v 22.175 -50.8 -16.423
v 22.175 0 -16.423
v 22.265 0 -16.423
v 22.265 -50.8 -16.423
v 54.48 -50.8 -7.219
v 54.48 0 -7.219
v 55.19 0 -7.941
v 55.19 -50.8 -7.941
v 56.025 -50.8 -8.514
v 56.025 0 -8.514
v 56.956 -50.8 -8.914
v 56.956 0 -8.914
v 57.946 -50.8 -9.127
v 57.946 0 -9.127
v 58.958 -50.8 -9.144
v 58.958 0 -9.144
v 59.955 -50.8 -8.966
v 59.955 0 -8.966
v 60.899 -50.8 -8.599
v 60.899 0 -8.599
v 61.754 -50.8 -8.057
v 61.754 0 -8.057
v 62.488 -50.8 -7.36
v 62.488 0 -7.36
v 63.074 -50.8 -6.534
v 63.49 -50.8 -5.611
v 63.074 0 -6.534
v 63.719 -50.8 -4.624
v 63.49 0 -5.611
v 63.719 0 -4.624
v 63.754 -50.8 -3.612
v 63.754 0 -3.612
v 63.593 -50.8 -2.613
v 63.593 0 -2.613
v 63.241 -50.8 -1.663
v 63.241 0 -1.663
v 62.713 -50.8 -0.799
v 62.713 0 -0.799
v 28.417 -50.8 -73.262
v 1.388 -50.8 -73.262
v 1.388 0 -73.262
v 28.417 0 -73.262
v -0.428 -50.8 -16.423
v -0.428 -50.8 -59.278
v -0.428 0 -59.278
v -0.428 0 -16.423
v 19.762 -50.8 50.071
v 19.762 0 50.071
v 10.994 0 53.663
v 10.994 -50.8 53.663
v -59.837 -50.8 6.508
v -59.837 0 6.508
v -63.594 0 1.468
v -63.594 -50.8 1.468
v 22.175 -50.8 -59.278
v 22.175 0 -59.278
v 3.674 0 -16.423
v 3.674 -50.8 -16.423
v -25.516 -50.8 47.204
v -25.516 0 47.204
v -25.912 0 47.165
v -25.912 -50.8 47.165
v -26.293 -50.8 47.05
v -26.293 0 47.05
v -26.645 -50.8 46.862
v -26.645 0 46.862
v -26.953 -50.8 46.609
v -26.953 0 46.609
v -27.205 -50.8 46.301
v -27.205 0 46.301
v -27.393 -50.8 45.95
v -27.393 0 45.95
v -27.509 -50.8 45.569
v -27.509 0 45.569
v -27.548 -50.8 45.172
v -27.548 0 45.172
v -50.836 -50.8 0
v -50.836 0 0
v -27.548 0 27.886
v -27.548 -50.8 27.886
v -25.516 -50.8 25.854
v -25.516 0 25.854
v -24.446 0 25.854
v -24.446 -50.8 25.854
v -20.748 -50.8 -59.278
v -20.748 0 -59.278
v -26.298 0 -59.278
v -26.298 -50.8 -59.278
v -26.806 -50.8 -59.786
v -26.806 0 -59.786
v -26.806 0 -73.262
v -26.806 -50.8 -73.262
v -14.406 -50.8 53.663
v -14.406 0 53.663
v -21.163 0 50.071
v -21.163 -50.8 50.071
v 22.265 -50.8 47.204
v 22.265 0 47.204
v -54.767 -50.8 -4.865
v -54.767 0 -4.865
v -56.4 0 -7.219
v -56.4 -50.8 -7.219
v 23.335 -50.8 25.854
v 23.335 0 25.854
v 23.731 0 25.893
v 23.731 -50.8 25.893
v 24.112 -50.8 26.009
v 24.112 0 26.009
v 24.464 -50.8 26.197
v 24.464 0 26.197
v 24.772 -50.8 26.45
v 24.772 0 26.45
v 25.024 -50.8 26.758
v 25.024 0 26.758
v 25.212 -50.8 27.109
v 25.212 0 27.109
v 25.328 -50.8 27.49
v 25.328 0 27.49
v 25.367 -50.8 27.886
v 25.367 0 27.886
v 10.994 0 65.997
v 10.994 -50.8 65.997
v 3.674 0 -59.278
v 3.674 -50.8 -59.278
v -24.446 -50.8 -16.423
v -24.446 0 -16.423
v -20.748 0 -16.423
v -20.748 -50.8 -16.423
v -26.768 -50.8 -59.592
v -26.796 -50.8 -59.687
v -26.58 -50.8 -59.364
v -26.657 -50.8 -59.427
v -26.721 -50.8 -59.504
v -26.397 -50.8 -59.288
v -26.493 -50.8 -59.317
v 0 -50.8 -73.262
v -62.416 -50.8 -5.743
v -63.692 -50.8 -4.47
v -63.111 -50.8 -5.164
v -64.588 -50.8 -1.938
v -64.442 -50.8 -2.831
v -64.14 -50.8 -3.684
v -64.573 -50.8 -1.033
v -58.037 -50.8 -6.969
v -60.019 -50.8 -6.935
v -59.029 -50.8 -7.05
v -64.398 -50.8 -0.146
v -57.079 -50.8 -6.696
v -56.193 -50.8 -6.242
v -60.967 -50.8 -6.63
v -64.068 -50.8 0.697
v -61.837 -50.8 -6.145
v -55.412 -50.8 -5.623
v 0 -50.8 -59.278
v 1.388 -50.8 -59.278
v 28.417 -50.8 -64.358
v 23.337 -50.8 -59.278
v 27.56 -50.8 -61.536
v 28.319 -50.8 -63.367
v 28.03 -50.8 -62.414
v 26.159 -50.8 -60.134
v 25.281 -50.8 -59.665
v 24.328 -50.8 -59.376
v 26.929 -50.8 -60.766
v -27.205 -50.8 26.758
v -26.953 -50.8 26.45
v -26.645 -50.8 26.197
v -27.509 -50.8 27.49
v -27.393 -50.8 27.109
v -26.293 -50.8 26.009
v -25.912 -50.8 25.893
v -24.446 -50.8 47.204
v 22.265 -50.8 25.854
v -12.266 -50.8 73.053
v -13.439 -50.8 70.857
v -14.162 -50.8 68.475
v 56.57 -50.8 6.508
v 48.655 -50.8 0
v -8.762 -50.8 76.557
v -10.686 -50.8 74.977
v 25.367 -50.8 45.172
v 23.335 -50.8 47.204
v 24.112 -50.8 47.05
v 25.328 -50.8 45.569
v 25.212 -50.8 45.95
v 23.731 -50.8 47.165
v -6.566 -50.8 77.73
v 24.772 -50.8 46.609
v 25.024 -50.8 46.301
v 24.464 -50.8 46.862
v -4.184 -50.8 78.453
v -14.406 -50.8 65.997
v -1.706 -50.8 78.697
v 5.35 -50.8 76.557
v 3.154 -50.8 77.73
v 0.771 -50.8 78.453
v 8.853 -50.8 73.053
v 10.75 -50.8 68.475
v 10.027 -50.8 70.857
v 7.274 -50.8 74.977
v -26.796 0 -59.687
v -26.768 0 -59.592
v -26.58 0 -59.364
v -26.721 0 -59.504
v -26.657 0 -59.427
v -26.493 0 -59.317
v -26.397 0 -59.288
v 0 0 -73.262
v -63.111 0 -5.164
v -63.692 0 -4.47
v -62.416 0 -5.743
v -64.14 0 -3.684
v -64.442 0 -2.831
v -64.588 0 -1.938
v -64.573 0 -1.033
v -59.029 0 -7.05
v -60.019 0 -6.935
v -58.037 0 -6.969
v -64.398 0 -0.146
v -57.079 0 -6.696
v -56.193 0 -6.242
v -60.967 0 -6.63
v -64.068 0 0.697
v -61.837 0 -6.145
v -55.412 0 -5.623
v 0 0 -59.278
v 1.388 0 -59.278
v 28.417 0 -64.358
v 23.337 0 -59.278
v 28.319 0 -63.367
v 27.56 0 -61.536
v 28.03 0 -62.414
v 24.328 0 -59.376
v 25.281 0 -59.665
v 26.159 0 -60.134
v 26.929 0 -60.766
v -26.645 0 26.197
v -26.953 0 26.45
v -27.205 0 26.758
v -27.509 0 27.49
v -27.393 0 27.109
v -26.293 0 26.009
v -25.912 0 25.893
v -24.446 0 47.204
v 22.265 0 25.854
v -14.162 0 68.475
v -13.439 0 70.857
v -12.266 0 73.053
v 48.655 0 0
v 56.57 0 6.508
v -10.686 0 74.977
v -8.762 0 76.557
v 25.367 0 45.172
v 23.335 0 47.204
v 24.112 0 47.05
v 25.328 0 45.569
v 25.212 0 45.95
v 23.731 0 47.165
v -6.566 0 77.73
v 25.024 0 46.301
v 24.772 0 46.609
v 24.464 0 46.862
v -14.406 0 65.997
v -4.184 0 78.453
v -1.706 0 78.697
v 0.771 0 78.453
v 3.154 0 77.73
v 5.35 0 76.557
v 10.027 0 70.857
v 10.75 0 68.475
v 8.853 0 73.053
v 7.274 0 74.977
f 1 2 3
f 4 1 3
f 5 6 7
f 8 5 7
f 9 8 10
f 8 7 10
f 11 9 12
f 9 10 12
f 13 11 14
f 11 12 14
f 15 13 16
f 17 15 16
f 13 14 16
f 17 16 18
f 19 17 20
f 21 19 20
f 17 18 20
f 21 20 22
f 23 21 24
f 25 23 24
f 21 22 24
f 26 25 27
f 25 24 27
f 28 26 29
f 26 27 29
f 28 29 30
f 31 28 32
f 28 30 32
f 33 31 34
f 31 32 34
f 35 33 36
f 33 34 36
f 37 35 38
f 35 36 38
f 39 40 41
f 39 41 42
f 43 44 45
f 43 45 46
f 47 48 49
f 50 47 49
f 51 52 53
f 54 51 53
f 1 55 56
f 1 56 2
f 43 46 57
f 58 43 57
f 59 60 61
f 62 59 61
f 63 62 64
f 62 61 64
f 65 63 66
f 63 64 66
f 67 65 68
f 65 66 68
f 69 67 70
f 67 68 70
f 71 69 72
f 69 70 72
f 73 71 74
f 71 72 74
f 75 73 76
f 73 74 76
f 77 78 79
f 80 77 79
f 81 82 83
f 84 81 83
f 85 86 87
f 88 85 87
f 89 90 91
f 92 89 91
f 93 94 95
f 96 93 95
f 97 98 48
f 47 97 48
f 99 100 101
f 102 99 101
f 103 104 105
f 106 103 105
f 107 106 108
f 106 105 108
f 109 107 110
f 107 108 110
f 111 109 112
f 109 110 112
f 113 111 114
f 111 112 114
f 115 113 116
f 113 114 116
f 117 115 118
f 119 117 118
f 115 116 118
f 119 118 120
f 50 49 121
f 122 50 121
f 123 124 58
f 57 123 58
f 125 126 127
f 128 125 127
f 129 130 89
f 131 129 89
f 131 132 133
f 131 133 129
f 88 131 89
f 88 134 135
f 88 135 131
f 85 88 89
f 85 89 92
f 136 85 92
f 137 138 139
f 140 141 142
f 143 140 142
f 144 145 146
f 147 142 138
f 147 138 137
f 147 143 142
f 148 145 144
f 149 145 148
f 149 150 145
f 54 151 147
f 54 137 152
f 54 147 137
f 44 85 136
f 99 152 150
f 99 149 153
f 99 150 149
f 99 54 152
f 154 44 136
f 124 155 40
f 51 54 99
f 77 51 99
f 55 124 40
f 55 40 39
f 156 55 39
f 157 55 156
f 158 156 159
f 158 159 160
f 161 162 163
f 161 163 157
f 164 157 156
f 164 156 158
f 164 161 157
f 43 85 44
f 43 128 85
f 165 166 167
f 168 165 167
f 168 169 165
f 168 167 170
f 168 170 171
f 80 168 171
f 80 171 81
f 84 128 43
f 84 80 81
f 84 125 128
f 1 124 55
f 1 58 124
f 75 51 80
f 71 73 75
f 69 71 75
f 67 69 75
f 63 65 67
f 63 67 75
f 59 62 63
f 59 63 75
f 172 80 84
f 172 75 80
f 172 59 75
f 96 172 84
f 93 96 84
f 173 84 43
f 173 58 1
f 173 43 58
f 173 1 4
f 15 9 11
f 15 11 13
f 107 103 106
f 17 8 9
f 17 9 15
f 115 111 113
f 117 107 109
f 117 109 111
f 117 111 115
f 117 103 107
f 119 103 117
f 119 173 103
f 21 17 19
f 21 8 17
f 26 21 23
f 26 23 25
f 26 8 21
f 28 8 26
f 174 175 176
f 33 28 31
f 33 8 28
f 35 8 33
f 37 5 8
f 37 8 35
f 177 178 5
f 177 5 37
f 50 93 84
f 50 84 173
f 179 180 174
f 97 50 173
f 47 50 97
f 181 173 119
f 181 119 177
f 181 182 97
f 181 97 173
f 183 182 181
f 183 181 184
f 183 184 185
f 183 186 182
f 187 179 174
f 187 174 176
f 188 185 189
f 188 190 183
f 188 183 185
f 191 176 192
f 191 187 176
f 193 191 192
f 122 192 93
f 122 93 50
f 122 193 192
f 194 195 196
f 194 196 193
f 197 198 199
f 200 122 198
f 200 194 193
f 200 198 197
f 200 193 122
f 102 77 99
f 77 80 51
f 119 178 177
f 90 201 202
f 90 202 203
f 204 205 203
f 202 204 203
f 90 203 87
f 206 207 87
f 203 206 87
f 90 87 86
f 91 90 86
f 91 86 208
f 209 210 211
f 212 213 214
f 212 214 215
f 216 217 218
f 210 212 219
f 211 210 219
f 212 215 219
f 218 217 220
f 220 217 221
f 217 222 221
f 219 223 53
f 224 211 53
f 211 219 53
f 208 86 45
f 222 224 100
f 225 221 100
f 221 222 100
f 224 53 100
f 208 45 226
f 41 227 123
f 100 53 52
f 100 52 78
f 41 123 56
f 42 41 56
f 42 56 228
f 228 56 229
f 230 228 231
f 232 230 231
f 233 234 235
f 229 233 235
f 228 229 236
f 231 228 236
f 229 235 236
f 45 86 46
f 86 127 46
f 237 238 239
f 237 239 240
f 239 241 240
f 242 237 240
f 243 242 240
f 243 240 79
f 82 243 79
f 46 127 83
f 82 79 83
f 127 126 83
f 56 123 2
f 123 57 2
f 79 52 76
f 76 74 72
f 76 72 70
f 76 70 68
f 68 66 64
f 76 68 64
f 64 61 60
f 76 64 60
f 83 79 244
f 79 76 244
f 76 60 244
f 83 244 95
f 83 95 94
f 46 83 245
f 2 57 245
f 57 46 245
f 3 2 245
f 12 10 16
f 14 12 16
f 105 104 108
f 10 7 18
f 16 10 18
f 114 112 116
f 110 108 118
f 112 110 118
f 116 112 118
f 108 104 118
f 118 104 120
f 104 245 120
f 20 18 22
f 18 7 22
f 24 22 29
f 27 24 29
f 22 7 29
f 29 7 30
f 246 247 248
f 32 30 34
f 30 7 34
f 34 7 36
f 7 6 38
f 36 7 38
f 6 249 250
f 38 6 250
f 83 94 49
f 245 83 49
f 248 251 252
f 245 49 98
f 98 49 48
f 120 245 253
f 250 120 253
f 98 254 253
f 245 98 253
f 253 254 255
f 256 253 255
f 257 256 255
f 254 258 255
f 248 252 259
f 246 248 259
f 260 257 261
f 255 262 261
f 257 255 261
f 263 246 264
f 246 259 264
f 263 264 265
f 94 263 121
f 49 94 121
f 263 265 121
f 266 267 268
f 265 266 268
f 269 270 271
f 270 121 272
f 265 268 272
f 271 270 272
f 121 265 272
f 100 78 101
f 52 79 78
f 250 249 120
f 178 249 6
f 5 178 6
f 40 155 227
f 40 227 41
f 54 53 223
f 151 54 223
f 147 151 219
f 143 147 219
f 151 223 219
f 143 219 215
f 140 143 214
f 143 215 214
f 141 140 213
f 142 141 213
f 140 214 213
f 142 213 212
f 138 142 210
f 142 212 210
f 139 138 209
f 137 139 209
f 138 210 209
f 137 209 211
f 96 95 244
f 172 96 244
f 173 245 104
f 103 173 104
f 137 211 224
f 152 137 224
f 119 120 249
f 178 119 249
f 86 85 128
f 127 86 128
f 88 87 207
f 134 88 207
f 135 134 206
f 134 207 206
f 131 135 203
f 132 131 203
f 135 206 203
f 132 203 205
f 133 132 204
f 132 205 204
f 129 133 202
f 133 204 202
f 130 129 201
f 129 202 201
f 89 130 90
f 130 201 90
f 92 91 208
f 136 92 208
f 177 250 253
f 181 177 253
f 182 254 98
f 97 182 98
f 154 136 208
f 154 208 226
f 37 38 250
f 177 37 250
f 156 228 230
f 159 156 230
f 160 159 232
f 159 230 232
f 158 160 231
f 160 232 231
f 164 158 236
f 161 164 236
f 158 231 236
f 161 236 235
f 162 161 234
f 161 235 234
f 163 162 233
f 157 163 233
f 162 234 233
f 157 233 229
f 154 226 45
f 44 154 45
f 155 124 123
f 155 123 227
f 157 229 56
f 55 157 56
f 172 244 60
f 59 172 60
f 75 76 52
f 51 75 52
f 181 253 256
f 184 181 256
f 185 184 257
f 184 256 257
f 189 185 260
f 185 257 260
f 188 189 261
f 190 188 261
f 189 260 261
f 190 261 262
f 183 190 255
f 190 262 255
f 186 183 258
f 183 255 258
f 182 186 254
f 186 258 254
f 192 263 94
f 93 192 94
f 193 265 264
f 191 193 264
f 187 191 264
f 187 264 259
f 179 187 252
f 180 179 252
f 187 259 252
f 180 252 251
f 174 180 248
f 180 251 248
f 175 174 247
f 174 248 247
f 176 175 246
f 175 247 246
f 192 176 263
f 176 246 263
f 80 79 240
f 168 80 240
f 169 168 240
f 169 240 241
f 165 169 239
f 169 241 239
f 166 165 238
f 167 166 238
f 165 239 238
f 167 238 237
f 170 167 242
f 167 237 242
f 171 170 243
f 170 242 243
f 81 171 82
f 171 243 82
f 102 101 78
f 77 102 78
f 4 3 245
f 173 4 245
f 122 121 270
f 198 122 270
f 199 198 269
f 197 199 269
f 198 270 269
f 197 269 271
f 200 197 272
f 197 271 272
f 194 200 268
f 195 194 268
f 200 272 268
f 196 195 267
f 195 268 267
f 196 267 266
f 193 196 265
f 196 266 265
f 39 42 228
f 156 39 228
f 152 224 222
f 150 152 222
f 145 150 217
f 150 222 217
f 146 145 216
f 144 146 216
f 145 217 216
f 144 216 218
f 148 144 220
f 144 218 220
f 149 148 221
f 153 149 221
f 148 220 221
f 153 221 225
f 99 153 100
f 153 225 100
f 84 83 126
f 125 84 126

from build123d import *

# Parameters (mm, degrees)
F0_W     = 20.32
F0_H     = 42.8552175019
F0_W_2   = 18.5010901187
F1_DEPTH = 50.8


with BuildPart() as f1:
    # F0 (on Front) → F1 (new body)
    with BuildSketch(Plane.XZ):
        with BuildLine():
            Line((19.7615846992, 50.0709023562), (10.9937762186, 53.6630048046))
            ThreePointArc((10.9937762186, 53.6630048046), (9.505878667, 50.0709023562), (5.9137762186, 48.5830048046))
            Line((5.9137762186, 48.5830048046), (-1.7062237814, 48.5830048046))
            Line((-1.7062237814, 48.5830048046), (-9.3262237814, 48.5830048046))
            ThreePointArc((-9.3262237814, 48.5830048046), (-12.9183262298, 50.0709023562), (-14.4062237814, 53.6630048046))
            Line((-14.4062237814, 53.6630048046), (-21.1631003767, 50.0709023562))
            Line((-21.1631003767, 50.0709023562), (-24.4459839703, 47.2041854043))
            Line((-24.4459839703, 47.2041854043), (-24.4459839703, 25.8544358869))
            Line((-24.4459839703, 25.8544358869), (-24.4459839703, -16.4229627699))
            Line((-24.4459839703, -16.4229627699), (-20.7482980642, -16.4229627699))
            Line((-20.7482980642, -16.4229627699), (-0.4282980642, -16.4229627699))
            Line((-0.4282980642, -16.4229627699), (3.6740194462, -16.4229627699))
            Line((3.6740194462, -16.4229627699), (22.1751095649, -16.4229627699))
            Line((22.1751095649, -16.4229627699), (22.2648918826, -16.4229627699))
            Line((22.2648918826, -16.4229627699), (22.2648918826, 25.8544358869))
            Line((22.2648918826, 25.8544358869), (22.2648918826, 47.2041854043))
            Line((22.2648918826, 47.2041854043), (19.7615846992, 50.0709023562))
        make_face()
        with BuildLine():
            Line((23.3347140718, 47.2041854043), (22.2648918826, 47.2041854043))
            Line((22.2648918826, 47.2041854043), (22.2648918826, 25.8544358869))
            Line((22.2648918826, 25.8544358869), (23.3347140718, 25.8544358869))
            ThreePointArc((23.3347140718, 25.8544358869), (24.7715550512, 26.4495949076), (25.3667140718, 27.8864358869))
            Line((25.3667140718, 27.8864358869), (25.3667140718, 45.1721854043))
            ThreePointArc((25.3667140718, 45.1721854043), (24.7715550512, 46.6090263836), (23.3347140718, 47.2041854043))
        make_face()
        Polygon((56.5698947954, 6.5076726805), (25.3667140718, 45.1721854043), (25.3667140718, 27.8864358869), (48.6546903849, 0), (52.1676763892, 2.9549777973), align=None)
        with BuildLine():
            Line((62.7134148699, -0.7986944953), (56.5698947954, 6.5076726805))
            Line((56.5698947954, 6.5076726805), (52.1676763892, 2.9549777973))
            Line((52.1676763892, 2.9549777973), (48.6546903849, 0))
            Line((48.6546903849, 0), (54.4804789865, -7.2188562926))
            ThreePointArc((54.4804789865, -7.2188562926), (61.7538678556, -8.0570733036), (62.7134148699, -0.7986944953))
        make_face()
        with BuildLine():
            Line((-24.4459839703, 25.8544358869), (-24.4459839703, 47.2041854043))
            Line((-24.4459839703, 47.2041854043), (-25.5158065703, 47.2041854043))
            ThreePointArc((-25.5158065703, 47.2041854043), (-26.9526475496, 46.6090263836), (-27.5478065703, 45.1721854043))
            Line((-27.5478065703, 45.1721854043), (-27.5478065703, 27.8864358869))
            ThreePointArc((-27.5478065703, 27.8864358869), (-26.9526475496, 26.4495949076), (-25.5158065703, 25.8544358869))
            Line((-25.5158065703, 25.8544358869), (-24.4459839703, 25.8544358869))
        make_face()
        Polygon((-27.5478065703, 27.8864358869), (-27.5478065703, 45.1721854043), (-59.8365601521, 6.5076726805), (-50.8357828875, 0), align=None)
        with BuildLine():
            Line((-50.8357828875, 0), (-59.8365601521, 6.5076726805))
            Line((-59.8365601521, 6.5076726805), (-63.5941543789, 1.4677946764))
            ThreePointArc((-63.5941543789, 1.4677946764), (-64.5350303405, -2.3878407212), (-62.4158617427, -5.7434772254))
            Line((-62.4158617427, -5.7434772254), (-61.8365846936, -6.1450817318))
            ThreePointArc((-61.8365846936, -6.1450817318), (-58.0368035716, -6.9689157861), (-54.7674139269, -4.8646034341))
            Line((-54.7674139269, -4.8646034341), (-56.3995838165, -7.2188562926))
            Line((-56.3995838165, -7.2188562926), (-50.8357828875, 0))
        make_face()
        with Locations((-10.5882980642, -37.8505715208)):
            Rectangle(F0_W, F0_H)
        with Locations((12.9245645056, -37.8505715208)):
            Rectangle(F0_W_2, F0_H)
        with BuildLine():
            Line((23.3365580372, -59.2781802717), (22.1751095649, -59.2781802717))
            Line((22.1751095649, -59.2781802717), (3.6740194462, -59.2781802717))
            Line((3.6740194462, -59.2781802717), (1.3876754092, -59.2781802717))
            Line((1.3876754092, -59.2781802717), (1.3876754092, -73.2621923089))
            Line((1.3876754092, -73.2621923089), (28.4165580372, -73.2621923089))
            Line((28.4165580372, -73.2621923089), (28.4165580372, -64.3581802717))
            ThreePointArc((28.4165580372, -64.3581802717), (26.9286604856, -60.7660778233), (23.3365580372, -59.2781802717))
        make_face()
        with BuildLine():
            Line((0, -59.2781802717), (-0.4282980642, -59.2781802717))
            Line((-0.4282980642, -59.2781802717), (-20.7482980642, -59.2781802717))
            Line((-20.7482980642, -59.2781802717), (-26.2982390387, -59.2781802717))
            ThreePointArc((-26.2982390387, -59.2781802717), (-26.6574492835, -59.4269700269), (-26.8062390387, -59.7861802717))
            Line((-26.8062390387, -59.7861802717), (-26.8062390387, -73.2621923089))
            Line((-26.8062390387, -73.2621923089), (0, -73.2621923089))
            Line((0, -73.2621923089), (0, -59.7561709583))
            Line((0, -59.7561709583), (0, -59.2781802717))
        make_face()
        with BuildLine():
            ThreePointArc((5.9137762186, 48.5830048046), (9.505878667, 50.0709023562), (10.9937762186, 53.6630048046))
            Line((10.9937762186, 53.6630048046), (10.9937762186, 55.117353797))
            Line((10.9937762186, 55.117353797), (10.9937762186, 58.5980406803))
            Line((10.9937762186, 58.5980406803), (10.9937762186, 62.3222826543))
            Line((10.9937762186, 62.3222826543), (10.9937762186, 65.9971610492))
            ThreePointArc((10.9937762186, 65.9971610492), (7.2740323397, 74.9774171703), (-1.7062237814, 78.6971610492))
            ThreePointArc((-1.7062237814, 78.6971610492), (-10.6864799025, 74.9774171703), (-14.4062237814, 65.9971610492))
            Line((-14.4062237814, 65.9971610492), (-14.4062237814, 62.3222826543))
            Line((-14.4062237814, 62.3222826543), (-14.4062237814, 58.5980406803))
            Line((-14.4062237814, 58.5980406803), (-14.4062237814, 55.117353797))
            Line((-14.4062237814, 55.117353797), (-14.4062237814, 53.6630048046))
            ThreePointArc((-14.4062237814, 53.6630048046), (-12.9183262298, 50.0709023562), (-9.3262237814, 48.5830048046))
            Line((-9.3262237814, 48.5830048046), (-1.7062237814, 48.5830048046))
            Line((-1.7062237814, 48.5830048046), (5.9137762186, 48.5830048046))
        make_face()
    extrude(amount=F1_DEPTH)


solid = f1.part
